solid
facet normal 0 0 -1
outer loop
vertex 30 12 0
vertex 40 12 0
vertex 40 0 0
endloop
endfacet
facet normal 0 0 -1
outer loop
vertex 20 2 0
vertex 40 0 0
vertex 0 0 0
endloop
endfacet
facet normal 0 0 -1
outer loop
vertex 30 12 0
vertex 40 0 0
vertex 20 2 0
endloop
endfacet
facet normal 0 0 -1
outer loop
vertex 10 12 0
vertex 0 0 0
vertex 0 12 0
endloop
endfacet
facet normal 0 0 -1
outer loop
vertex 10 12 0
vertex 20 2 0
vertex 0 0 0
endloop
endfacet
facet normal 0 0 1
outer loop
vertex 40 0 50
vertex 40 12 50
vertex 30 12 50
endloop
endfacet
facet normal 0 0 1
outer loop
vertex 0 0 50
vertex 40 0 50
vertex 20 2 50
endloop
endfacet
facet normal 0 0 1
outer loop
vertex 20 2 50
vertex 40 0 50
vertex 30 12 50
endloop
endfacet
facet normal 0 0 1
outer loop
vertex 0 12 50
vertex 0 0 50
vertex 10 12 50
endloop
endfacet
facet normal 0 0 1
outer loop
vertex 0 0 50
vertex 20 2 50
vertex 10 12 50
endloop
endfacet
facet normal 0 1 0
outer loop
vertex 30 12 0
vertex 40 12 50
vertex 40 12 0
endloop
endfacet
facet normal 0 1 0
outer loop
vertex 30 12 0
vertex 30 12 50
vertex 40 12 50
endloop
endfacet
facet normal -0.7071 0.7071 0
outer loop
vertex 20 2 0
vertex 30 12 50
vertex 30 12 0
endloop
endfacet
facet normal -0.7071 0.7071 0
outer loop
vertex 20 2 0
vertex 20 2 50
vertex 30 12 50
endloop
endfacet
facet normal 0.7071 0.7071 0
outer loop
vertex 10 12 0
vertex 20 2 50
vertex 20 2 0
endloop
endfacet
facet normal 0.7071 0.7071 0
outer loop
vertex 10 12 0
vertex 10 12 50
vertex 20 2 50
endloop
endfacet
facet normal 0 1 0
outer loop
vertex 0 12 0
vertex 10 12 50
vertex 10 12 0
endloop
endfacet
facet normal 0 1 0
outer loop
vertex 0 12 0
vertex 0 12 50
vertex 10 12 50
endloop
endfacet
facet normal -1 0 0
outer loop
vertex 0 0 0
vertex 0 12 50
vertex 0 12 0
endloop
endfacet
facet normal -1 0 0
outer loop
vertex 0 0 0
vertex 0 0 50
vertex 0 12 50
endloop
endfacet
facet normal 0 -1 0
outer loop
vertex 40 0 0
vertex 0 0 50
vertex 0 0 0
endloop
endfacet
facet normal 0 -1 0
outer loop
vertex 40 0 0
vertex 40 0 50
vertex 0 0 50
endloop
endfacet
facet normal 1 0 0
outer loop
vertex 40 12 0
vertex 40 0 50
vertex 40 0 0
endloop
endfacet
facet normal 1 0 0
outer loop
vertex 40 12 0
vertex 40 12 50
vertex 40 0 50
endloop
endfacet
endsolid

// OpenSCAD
$fn = 32;

// ----------------------------------------------------------------------
// V guide rail: vway, 40 mm wide
// ----------------------------------------------------------------------

// --- parameters (mm) ---
rail_w = 40;              // rail width, X
base_t = 12;              // base plate thickness
v_depth = 10;             // V feature depth / height
v_half_w = 10;            // half width of the V at the base face
plate_t = 50;             // rail length, Z (the extrusion height)

profile = [[0, 0], [40, 0], [40, 12], [30, 12], [20, 2], [10, 12], [0, 12]];  // primary outline, 7 points, counter clockwise

// --- the one profile operation ---
linear_extrude(height = plate_t) polygon(points = profile);
